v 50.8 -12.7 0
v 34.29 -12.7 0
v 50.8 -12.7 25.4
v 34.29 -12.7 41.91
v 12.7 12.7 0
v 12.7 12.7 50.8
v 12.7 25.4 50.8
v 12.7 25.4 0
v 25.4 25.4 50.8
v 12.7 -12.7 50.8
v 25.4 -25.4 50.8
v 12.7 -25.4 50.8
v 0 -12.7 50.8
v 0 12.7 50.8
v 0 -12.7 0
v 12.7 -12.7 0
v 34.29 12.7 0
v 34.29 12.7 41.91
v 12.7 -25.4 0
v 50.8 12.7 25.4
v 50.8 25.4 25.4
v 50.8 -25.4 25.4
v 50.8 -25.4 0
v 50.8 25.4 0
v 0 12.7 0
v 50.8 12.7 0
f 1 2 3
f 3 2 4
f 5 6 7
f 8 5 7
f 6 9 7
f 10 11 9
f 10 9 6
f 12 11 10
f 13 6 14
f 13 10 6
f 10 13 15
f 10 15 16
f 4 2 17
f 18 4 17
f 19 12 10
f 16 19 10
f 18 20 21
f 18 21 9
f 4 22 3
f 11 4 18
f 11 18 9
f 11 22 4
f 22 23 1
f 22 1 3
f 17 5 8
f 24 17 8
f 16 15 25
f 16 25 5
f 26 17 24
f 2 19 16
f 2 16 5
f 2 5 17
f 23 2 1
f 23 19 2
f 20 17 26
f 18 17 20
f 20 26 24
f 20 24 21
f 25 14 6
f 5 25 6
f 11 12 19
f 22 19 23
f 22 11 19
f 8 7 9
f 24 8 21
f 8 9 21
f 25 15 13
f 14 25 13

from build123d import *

# Parameters (mm, degrees)
F0_W     = 12.7
F0_H     = 50.8
F1_DEPTH = 25.4
F2_W     = 12.7
F2_H     = 12.7
F2_W_2   = 16.51
F2_H_2   = 25.4
F3_DEPTH = 50.801


# Not quite as in the source:
# - a feature names something its author has since deleted; it is built from what else it names


with BuildPart() as f1:
    # F0 (on Front) → F1 (new body, symmetric)
    with BuildSketch(Plane.XZ):
        with Locations((6.35, 25.4)):
            Rectangle(F0_W, F0_H)
        Polygon((12.7, 50.8), (12.7, 0), (25.4, 0), (50.8, 0), (50.8, 25.4), (25.4, 50.8), align=None)
    extrude(amount=F1_DEPTH, both=True)

    # F2 (on face) → F3 (cut, through all)
    with BuildSketch(Plane.XY.offset(50.8)):
        with Locations((6.35, -19.05)):
            Rectangle(F2_W, F2_H)
        with Locations((6.35, 19.05)):
            Rectangle(F2_W, F2_H)
        with Locations((42.545, 0)):
            Rectangle(F2_W_2, F2_H_2)
    extrude(amount=-F3_DEPTH, mode=Mode.SUBTRACT)


solid = f1.part
